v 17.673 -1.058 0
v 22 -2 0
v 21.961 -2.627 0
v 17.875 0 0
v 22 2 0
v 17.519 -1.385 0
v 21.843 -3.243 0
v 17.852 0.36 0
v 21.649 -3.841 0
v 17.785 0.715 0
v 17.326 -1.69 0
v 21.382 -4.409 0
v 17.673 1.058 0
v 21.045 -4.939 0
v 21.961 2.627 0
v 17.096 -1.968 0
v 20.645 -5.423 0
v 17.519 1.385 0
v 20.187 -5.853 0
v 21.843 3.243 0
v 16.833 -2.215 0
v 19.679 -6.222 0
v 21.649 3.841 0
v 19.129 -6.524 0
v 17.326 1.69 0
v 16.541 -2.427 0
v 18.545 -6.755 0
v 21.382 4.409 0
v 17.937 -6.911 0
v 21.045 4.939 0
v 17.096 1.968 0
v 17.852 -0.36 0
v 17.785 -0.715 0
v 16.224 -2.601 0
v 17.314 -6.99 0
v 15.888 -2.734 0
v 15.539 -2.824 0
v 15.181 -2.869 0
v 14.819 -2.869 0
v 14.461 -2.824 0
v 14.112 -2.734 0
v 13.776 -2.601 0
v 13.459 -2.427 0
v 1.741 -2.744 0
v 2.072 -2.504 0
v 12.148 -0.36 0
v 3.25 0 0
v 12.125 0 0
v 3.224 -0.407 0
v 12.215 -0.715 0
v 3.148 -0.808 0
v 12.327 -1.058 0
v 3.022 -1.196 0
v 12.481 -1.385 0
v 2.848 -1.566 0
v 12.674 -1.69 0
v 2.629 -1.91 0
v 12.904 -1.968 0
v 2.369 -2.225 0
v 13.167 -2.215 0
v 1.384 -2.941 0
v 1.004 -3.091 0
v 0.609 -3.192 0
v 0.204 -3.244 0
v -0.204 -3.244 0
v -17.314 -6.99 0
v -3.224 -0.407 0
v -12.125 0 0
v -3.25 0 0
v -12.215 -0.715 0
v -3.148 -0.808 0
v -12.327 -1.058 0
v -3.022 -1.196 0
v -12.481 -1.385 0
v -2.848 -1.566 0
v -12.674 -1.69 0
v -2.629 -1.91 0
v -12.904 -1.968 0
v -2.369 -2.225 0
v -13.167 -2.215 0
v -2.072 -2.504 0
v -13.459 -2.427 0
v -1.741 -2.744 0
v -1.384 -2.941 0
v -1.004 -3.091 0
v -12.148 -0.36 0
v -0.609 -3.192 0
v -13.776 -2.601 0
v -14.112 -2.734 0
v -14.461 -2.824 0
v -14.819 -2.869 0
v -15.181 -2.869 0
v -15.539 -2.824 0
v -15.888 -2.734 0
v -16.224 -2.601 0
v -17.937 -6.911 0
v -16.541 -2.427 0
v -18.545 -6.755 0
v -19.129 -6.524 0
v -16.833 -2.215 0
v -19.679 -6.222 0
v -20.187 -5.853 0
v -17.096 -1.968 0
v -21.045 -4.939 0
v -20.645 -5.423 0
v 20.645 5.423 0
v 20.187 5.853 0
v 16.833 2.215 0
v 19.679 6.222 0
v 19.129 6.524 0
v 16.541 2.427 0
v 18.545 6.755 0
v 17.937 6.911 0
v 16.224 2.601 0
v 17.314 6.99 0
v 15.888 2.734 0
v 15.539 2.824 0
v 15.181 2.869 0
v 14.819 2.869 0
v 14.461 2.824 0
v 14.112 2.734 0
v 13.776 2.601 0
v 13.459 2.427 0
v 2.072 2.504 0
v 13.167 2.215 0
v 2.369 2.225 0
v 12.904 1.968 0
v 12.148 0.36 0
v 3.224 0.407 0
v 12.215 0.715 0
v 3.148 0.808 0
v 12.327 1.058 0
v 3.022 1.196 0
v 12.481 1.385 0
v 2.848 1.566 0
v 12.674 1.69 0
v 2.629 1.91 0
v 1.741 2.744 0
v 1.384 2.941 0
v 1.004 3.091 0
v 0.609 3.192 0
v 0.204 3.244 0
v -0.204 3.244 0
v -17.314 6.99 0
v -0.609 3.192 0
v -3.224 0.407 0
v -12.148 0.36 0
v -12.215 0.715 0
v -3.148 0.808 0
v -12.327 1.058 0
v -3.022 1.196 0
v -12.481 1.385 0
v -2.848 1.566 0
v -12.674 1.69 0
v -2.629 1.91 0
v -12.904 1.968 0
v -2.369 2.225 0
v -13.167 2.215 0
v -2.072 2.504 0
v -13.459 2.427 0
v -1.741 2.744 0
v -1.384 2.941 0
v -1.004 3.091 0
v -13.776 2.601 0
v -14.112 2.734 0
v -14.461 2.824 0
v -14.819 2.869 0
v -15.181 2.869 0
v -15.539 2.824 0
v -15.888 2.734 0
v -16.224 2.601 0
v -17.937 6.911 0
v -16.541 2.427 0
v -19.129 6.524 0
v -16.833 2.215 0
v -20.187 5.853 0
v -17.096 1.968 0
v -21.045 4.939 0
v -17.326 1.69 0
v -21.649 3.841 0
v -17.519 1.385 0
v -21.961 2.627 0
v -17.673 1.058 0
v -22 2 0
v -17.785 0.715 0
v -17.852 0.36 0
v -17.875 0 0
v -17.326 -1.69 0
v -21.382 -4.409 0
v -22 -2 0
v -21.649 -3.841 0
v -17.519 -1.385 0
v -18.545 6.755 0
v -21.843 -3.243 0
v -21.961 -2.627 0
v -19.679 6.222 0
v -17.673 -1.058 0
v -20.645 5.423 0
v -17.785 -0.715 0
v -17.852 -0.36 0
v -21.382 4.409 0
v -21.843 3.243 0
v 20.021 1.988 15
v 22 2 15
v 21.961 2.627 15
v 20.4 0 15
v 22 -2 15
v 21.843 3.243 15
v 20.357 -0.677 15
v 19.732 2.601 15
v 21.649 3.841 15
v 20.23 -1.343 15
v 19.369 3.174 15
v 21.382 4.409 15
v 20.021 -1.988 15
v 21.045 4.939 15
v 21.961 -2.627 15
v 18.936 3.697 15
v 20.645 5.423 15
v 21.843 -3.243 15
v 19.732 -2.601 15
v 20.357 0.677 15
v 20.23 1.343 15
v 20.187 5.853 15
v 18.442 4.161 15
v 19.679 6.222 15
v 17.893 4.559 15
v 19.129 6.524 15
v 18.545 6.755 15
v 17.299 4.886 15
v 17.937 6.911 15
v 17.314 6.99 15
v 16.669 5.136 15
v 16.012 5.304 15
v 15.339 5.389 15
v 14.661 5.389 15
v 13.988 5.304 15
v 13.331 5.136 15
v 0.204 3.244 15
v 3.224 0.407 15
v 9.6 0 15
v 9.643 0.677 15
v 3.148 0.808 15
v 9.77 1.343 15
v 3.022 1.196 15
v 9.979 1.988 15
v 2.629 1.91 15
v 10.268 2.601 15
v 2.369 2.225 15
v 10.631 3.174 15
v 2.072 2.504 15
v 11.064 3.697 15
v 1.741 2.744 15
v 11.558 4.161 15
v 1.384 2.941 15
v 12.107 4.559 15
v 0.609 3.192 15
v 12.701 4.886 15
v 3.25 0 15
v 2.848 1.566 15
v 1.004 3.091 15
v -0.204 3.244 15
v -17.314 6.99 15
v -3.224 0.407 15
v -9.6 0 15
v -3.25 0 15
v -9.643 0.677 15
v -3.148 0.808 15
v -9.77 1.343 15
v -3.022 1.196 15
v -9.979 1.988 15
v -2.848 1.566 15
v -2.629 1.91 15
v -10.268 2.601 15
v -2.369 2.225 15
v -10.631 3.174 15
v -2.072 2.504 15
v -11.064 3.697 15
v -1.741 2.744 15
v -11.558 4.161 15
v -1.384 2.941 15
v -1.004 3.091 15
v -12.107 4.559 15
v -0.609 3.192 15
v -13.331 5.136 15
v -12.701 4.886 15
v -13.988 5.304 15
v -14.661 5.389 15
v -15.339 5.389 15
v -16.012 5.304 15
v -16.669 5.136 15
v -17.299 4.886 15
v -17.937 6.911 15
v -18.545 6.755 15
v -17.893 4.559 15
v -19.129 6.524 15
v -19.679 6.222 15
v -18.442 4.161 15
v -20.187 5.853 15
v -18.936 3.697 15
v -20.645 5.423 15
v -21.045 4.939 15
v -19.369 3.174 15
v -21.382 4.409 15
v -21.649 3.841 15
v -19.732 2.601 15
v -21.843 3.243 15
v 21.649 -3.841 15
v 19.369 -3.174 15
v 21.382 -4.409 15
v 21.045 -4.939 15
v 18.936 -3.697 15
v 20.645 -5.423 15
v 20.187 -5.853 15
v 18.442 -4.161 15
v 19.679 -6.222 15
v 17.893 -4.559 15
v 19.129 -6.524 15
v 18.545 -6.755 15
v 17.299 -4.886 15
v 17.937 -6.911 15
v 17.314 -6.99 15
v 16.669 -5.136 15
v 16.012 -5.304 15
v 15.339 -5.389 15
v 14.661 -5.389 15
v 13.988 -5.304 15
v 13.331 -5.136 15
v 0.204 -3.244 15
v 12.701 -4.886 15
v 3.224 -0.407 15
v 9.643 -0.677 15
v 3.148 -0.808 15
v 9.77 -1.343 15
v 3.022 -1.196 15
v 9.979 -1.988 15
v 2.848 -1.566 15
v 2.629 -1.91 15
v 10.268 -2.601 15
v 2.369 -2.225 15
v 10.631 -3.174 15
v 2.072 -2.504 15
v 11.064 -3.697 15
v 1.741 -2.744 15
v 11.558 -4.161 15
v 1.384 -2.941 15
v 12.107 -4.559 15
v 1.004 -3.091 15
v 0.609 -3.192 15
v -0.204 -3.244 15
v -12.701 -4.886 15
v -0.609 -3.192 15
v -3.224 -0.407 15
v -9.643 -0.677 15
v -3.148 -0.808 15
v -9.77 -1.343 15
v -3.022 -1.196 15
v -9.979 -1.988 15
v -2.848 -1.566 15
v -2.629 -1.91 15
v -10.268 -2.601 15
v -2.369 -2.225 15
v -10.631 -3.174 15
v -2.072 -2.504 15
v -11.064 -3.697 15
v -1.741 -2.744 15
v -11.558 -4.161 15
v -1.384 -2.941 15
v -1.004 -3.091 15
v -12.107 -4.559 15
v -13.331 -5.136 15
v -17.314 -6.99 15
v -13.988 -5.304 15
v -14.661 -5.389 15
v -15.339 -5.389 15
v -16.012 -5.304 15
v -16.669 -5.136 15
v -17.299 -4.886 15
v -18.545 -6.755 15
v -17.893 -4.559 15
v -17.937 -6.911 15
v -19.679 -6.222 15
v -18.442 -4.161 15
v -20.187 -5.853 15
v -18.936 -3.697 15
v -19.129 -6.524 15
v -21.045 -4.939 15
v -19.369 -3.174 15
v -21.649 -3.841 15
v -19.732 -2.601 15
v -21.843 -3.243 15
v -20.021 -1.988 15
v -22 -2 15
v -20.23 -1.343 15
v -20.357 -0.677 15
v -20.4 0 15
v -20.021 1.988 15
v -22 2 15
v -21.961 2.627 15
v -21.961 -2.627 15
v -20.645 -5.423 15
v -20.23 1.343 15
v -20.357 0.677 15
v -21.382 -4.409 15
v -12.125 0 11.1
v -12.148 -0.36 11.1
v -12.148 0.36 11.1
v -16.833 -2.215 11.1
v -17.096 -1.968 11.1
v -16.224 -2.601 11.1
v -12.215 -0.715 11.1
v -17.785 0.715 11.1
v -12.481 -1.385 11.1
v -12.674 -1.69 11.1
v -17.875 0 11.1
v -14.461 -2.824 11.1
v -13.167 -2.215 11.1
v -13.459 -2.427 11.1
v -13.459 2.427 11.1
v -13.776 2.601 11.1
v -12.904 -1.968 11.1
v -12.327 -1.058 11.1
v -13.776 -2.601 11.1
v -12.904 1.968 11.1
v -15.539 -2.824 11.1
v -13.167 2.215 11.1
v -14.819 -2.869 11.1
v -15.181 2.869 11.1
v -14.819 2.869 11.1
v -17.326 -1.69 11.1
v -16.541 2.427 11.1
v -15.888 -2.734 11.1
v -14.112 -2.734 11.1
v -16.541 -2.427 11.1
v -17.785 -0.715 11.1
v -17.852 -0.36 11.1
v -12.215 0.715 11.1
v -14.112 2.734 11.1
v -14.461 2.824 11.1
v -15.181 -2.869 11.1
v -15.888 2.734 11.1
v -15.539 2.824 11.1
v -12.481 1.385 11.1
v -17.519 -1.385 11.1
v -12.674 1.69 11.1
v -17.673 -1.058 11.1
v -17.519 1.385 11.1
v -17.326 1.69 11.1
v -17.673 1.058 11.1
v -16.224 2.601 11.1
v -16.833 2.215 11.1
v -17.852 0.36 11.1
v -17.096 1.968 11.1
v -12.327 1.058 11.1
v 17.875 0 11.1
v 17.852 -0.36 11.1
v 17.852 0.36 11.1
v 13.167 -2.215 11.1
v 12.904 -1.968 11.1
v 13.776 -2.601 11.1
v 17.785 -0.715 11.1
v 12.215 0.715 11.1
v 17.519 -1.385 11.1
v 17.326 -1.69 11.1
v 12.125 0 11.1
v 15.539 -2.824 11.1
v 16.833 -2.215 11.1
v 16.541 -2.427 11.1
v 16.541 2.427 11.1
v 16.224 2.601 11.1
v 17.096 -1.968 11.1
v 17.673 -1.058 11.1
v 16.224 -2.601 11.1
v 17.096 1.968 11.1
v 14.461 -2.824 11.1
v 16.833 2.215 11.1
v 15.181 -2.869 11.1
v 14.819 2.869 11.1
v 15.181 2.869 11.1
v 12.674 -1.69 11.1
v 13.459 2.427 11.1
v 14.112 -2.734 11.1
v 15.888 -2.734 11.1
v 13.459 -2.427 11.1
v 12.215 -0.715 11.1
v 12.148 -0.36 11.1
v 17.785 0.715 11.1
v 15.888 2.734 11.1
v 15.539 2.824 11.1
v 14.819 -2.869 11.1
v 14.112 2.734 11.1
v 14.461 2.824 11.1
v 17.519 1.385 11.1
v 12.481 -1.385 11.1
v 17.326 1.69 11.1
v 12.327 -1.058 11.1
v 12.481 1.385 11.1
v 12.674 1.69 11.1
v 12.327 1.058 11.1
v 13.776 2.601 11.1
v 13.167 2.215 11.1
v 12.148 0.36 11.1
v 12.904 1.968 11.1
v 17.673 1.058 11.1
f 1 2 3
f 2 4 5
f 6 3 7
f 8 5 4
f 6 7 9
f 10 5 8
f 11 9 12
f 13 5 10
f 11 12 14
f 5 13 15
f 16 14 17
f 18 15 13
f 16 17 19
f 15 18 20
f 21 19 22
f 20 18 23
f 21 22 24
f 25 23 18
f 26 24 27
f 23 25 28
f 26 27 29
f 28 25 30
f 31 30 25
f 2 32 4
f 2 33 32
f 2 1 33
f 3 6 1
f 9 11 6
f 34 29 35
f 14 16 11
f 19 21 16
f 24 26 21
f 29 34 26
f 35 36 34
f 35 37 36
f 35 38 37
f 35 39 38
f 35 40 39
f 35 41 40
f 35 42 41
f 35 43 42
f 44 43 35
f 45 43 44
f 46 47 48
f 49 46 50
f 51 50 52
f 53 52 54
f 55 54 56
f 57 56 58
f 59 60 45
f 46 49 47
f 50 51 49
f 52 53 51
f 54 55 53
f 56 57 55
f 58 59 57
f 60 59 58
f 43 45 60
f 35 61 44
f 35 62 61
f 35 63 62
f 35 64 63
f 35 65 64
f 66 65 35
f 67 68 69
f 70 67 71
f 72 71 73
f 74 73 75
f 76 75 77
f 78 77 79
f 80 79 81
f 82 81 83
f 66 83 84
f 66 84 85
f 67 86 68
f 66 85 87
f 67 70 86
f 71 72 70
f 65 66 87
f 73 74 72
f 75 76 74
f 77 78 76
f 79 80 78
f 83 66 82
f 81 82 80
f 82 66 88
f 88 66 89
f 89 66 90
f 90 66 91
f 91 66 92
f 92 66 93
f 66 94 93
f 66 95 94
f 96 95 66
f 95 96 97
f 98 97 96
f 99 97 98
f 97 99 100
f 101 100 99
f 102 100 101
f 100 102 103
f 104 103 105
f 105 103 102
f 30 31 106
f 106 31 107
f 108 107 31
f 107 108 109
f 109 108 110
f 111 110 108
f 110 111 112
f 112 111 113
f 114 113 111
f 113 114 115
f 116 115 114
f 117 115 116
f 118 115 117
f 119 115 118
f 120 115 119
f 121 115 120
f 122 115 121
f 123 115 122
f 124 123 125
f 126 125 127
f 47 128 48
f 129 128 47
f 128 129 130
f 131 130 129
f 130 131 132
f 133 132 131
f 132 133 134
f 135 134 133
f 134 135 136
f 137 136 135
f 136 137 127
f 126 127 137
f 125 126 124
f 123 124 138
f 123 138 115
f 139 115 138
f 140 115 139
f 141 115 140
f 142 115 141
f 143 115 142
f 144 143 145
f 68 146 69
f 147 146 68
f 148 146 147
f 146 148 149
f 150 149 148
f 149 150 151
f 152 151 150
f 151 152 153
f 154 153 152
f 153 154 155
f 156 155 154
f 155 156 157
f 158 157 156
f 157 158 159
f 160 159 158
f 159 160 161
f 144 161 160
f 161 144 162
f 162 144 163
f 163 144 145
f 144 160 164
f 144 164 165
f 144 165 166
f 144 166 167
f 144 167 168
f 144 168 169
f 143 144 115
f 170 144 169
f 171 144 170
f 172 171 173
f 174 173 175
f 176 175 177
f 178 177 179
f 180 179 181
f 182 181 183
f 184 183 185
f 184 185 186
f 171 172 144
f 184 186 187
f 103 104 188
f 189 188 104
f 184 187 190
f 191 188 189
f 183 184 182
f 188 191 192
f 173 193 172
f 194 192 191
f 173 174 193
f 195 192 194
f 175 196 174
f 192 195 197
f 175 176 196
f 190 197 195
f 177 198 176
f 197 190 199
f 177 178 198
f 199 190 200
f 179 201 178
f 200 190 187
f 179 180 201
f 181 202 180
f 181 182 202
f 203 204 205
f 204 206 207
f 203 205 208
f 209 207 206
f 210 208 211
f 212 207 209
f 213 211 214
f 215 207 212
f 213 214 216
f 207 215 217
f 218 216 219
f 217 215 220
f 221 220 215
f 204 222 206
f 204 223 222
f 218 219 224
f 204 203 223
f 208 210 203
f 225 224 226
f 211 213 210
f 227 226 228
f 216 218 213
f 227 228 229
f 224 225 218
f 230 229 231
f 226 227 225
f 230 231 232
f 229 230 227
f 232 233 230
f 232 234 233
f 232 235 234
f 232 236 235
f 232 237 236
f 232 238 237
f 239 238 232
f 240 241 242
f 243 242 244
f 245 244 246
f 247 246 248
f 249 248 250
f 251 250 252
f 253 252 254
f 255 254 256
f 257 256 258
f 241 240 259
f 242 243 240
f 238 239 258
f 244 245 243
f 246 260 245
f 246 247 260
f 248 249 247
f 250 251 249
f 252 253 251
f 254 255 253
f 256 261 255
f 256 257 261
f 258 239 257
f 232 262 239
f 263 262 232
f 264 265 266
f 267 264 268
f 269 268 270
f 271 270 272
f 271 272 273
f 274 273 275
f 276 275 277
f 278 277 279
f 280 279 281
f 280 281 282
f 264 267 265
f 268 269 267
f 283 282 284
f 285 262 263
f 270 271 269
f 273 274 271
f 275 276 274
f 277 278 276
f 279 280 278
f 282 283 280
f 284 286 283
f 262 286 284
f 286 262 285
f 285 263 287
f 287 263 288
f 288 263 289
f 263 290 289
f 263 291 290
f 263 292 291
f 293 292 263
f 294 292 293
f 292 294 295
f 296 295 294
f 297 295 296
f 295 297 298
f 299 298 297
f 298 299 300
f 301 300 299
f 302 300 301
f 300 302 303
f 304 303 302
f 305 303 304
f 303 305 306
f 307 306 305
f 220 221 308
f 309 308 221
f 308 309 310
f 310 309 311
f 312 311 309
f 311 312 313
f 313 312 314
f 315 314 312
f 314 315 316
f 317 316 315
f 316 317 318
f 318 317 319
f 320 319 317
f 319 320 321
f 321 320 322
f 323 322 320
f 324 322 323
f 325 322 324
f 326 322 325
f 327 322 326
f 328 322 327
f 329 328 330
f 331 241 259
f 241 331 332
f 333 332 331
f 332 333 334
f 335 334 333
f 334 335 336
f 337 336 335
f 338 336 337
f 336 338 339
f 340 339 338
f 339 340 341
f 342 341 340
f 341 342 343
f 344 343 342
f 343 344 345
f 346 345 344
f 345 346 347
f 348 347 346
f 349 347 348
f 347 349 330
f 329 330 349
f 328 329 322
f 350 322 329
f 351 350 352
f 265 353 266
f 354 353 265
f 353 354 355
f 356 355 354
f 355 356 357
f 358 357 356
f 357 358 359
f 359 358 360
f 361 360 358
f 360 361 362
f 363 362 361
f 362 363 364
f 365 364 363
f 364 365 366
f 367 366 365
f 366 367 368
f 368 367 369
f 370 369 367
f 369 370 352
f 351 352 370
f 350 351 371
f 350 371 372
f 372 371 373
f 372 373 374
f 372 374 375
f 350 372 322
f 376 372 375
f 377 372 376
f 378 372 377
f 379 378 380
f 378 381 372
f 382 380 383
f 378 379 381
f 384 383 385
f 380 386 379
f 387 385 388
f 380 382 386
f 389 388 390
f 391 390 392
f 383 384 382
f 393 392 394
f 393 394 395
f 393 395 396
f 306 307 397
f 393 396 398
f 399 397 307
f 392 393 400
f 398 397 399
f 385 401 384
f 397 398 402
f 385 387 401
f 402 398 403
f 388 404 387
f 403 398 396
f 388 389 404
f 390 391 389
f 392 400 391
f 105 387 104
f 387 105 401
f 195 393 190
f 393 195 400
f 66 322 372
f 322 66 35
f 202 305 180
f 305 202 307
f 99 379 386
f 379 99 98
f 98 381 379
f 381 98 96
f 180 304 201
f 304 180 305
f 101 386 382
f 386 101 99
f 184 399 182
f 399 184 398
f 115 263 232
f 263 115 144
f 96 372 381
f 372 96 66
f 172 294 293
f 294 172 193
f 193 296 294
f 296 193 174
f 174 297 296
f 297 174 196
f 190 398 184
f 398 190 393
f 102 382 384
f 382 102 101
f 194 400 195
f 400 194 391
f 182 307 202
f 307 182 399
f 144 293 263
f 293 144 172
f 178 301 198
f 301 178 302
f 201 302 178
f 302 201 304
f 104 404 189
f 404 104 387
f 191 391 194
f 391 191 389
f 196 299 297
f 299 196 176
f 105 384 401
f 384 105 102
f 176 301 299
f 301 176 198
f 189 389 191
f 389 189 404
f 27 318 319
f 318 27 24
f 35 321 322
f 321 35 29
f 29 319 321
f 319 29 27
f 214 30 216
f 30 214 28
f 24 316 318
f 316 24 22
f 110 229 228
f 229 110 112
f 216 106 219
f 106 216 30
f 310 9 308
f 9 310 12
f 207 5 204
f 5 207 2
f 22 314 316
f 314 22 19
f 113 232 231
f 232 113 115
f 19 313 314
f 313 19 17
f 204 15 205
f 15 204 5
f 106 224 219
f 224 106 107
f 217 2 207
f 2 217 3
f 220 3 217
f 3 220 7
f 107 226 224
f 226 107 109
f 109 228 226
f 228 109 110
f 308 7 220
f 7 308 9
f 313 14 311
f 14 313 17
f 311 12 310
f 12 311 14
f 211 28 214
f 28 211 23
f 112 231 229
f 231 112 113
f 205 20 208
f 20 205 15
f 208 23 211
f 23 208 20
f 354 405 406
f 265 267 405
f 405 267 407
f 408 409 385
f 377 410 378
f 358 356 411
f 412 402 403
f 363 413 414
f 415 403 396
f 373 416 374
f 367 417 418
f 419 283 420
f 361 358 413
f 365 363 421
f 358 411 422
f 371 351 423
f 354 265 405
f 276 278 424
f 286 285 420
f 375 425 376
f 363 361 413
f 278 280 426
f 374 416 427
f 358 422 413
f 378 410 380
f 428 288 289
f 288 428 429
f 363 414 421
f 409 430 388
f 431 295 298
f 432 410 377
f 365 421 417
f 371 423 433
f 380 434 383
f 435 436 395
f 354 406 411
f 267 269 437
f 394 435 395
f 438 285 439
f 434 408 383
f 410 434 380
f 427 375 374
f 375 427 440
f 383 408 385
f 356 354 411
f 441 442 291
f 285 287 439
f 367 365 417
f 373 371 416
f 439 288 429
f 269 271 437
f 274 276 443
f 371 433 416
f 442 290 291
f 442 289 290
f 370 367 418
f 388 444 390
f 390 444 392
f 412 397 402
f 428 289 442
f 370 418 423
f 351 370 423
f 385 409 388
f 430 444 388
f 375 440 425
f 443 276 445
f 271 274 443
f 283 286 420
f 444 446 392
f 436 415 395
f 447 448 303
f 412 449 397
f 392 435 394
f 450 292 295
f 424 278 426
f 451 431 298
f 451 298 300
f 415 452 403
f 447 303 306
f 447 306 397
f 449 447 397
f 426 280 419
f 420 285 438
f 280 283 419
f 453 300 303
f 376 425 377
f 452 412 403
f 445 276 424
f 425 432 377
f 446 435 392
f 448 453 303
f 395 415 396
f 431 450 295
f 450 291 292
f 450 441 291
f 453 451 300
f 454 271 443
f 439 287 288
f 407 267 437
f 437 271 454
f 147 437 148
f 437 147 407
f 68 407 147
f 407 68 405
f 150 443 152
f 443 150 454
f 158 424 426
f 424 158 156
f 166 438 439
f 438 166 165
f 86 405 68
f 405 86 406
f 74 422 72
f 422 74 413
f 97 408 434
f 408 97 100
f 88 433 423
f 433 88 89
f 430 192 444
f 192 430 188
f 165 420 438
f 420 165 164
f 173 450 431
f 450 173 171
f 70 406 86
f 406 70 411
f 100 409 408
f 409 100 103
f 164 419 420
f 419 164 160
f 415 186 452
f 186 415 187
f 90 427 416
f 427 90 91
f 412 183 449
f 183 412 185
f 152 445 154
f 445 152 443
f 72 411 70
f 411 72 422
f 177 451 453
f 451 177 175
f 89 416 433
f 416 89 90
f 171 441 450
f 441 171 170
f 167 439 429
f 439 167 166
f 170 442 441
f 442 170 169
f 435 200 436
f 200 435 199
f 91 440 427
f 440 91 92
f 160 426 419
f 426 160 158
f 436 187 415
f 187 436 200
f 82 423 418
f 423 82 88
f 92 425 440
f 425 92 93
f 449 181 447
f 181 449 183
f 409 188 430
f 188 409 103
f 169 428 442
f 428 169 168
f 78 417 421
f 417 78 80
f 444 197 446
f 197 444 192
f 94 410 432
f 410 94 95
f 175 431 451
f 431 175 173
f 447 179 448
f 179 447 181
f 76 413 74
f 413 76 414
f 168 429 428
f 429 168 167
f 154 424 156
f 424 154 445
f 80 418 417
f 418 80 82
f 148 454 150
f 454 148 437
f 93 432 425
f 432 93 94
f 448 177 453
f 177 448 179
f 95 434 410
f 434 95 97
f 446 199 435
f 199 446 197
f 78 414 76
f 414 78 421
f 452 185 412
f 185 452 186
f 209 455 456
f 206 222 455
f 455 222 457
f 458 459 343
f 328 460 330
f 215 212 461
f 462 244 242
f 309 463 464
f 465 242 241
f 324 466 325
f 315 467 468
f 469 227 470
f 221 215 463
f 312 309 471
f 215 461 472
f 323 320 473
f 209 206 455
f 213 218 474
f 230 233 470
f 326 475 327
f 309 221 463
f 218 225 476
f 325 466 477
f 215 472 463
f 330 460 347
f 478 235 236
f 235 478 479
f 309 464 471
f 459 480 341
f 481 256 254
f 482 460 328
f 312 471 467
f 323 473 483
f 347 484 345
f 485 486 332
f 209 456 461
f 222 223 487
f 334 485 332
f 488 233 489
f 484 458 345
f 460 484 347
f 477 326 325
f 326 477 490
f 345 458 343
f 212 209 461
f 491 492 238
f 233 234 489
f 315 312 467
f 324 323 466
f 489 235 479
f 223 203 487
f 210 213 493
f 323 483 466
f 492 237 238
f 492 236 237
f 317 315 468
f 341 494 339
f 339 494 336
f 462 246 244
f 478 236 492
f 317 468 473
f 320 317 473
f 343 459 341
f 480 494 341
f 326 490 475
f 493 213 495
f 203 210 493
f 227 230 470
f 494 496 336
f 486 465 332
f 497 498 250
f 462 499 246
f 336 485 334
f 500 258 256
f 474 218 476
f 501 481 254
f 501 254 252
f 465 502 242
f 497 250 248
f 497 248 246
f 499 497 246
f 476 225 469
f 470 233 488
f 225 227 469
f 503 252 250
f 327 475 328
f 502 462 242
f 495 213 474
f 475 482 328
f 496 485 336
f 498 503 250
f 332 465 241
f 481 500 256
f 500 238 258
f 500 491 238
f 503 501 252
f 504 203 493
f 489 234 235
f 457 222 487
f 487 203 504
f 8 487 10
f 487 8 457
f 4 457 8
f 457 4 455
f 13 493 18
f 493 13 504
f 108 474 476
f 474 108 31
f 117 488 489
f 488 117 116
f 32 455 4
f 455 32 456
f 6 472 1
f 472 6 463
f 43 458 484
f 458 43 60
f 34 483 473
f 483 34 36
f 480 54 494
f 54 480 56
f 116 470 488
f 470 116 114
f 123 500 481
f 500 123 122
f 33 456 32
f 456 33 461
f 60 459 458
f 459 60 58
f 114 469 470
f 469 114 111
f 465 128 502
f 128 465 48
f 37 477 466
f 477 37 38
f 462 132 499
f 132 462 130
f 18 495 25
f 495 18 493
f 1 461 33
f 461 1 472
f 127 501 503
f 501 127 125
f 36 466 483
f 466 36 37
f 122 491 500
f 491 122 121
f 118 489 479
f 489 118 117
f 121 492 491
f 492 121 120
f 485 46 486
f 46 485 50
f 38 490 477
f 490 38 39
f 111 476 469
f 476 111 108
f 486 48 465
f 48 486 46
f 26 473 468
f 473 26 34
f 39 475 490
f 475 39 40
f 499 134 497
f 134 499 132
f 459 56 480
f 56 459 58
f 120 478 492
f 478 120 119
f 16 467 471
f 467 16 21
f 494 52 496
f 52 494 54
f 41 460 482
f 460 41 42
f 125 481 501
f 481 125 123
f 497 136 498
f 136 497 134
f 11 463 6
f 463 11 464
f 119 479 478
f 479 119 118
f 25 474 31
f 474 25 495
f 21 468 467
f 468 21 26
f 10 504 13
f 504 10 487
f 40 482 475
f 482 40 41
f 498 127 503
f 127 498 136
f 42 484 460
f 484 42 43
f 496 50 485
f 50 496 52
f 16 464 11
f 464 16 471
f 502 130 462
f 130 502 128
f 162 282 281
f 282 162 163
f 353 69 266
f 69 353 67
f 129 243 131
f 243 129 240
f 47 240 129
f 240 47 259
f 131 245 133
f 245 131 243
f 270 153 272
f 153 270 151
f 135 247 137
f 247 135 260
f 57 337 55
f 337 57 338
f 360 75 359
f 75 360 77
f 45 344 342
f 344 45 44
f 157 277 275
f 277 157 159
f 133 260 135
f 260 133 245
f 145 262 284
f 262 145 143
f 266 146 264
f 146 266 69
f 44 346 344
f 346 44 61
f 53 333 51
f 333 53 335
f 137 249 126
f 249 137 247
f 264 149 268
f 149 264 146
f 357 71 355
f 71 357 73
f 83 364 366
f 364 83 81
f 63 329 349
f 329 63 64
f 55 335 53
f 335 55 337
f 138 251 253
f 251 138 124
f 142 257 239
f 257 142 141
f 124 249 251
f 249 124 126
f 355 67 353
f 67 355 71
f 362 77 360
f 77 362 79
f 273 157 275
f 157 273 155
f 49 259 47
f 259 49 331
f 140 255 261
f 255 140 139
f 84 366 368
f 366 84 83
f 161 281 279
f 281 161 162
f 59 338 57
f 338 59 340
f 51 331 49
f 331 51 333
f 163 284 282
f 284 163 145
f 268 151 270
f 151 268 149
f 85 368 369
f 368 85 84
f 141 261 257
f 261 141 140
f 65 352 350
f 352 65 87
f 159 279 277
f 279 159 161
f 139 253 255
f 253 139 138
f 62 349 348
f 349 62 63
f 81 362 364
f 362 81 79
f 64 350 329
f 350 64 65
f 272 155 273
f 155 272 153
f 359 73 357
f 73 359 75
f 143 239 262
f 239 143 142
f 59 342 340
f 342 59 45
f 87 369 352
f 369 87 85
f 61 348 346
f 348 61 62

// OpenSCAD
$fn = 50;


difference() {
	union() {
		cylinder(h = 15, r = 7.0000000000);
		translate(v = [-7.5000000000, 0.0000000000, 0]) {
			hull() {
				translate(v = [-9.5000000000, 2.0000000000, 0]) {
					cylinder(h = 15, r = 5);
				}
				translate(v = [9.5000000000, 2.0000000000, 0]) {
					cylinder(h = 15, r = 5);
				}
				translate(v = [-9.5000000000, -2.0000000000, 0]) {
					cylinder(h = 15, r = 5);
				}
				translate(v = [9.5000000000, -2.0000000000, 0]) {
					cylinder(h = 15, r = 5);
				}
			}
		}
		translate(v = [-7.5000000000, 0.0000000000, 0]) {
			hull() {
				translate(v = [-9.5000000000, 2.0000000000, 0]) {
					cylinder(h = 15, r = 5);
				}
				translate(v = [9.5000000000, 2.0000000000, 0]) {
					cylinder(h = 15, r = 5);
				}
				translate(v = [-9.5000000000, -2.0000000000, 0]) {
					cylinder(h = 15, r = 5);
				}
				translate(v = [9.5000000000, -2.0000000000, 0]) {
					cylinder(h = 15, r = 5);
				}
			}
		}
		translate(v = [7.5000000000, 0.0000000000, 0]) {
			hull() {
				translate(v = [-9.5000000000, 2.0000000000, 0]) {
					cylinder(h = 15, r = 5);
				}
				translate(v = [9.5000000000, 2.0000000000, 0]) {
					cylinder(h = 15, r = 5);
				}
				translate(v = [-9.5000000000, -2.0000000000, 0]) {
					cylinder(h = 15, r = 5);
				}
				translate(v = [9.5000000000, -2.0000000000, 0]) {
					cylinder(h = 15, r = 5);
				}
			}
		}
		translate(v = [7.5000000000, 0.0000000000, 0]) {
			hull() {
				translate(v = [-9.5000000000, 2.0000000000, 0]) {
					cylinder(h = 15, r = 5);
				}
				translate(v = [9.5000000000, 2.0000000000, 0]) {
					cylinder(h = 15, r = 5);
				}
				translate(v = [-9.5000000000, -2.0000000000, 0]) {
					cylinder(h = 15, r = 5);
				}
				translate(v = [9.5000000000, -2.0000000000, 0]) {
					cylinder(h = 15, r = 5);
				}
			}
		}
	}
	union() {
		translate(v = [-15.0000000000, 0.0000000000, 15]) {
			rotate(a = [0, 0, 0]) {
				difference() {
					union() {
						#translate(v = [0, 0, -15.0000000000]) {
							cylinder(h = 15, r = 2.6000000000);
						}
						#translate(v = [0, 0, -3.9000000000]) {
							cylinder(h = 3.9000000000, r1 = 2.8750000000, r2 = 5.4000000000);
						}
						#translate(v = [0, 0, -15.0000000000]) {
							cylinder(h = 15, r = 2.8750000000);
						}
						#translate(v = [0, 0, -15.0000000000]) {
							cylinder(h = 15, r = 2.6000000000);
						}
					}
					union();
				}
			}
		}
		translate(v = [-15.0000000000, 0.0000000000, 15]) {
			rotate(a = [0, 0, 0]) {
				difference() {
					union() {
						#translate(v = [0, 0, -15.0000000000]) {
							cylinder(h = 15, r = 2.6000000000);
						}
						#translate(v = [0, 0, -3.9000000000]) {
							cylinder(h = 3.9000000000, r1 = 2.8750000000, r2 = 5.4000000000);
						}
						#translate(v = [0, 0, -15.0000000000]) {
							cylinder(h = 15, r = 2.8750000000);
						}
						#translate(v = [0, 0, -15.0000000000]) {
							cylinder(h = 15, r = 2.6000000000);
						}
					}
					union();
				}
			}
		}
		translate(v = [15.0000000000, 0.0000000000, 15]) {
			rotate(a = [0, 0, 0]) {
				difference() {
					union() {
						#translate(v = [0, 0, -15.0000000000]) {
							cylinder(h = 15, r = 2.6000000000);
						}
						#translate(v = [0, 0, -3.9000000000]) {
							cylinder(h = 3.9000000000, r1 = 2.8750000000, r2 = 5.4000000000);
						}
						#translate(v = [0, 0, -15.0000000000]) {
							cylinder(h = 15, r = 2.8750000000);
						}
						#translate(v = [0, 0, -15.0000000000]) {
							cylinder(h = 15, r = 2.6000000000);
						}
					}
					union();
				}
			}
		}
		translate(v = [15.0000000000, 0.0000000000, 15]) {
			rotate(a = [0, 0, 0]) {
				difference() {
					union() {
						#translate(v = [0, 0, -15.0000000000]) {
							cylinder(h = 15, r = 2.6000000000);
						}
						#translate(v = [0, 0, -3.9000000000]) {
							cylinder(h = 3.9000000000, r1 = 2.8750000000, r2 = 5.4000000000);
						}
						#translate(v = [0, 0, -15.0000000000]) {
							cylinder(h = 15, r = 2.8750000000);
						}
						#translate(v = [0, 0, -15.0000000000]) {
							cylinder(h = 15, r = 2.6000000000);
						}
					}
					union();
				}
			}
		}
		translate(v = [0, 0, -100]) {
			cylinder(h = 200, r = 3.2500000000);
		}
		translate(v = [0, 0, -100]) {
			cylinder(h = 200, r = 1.8000000000);
		}
	}
}
